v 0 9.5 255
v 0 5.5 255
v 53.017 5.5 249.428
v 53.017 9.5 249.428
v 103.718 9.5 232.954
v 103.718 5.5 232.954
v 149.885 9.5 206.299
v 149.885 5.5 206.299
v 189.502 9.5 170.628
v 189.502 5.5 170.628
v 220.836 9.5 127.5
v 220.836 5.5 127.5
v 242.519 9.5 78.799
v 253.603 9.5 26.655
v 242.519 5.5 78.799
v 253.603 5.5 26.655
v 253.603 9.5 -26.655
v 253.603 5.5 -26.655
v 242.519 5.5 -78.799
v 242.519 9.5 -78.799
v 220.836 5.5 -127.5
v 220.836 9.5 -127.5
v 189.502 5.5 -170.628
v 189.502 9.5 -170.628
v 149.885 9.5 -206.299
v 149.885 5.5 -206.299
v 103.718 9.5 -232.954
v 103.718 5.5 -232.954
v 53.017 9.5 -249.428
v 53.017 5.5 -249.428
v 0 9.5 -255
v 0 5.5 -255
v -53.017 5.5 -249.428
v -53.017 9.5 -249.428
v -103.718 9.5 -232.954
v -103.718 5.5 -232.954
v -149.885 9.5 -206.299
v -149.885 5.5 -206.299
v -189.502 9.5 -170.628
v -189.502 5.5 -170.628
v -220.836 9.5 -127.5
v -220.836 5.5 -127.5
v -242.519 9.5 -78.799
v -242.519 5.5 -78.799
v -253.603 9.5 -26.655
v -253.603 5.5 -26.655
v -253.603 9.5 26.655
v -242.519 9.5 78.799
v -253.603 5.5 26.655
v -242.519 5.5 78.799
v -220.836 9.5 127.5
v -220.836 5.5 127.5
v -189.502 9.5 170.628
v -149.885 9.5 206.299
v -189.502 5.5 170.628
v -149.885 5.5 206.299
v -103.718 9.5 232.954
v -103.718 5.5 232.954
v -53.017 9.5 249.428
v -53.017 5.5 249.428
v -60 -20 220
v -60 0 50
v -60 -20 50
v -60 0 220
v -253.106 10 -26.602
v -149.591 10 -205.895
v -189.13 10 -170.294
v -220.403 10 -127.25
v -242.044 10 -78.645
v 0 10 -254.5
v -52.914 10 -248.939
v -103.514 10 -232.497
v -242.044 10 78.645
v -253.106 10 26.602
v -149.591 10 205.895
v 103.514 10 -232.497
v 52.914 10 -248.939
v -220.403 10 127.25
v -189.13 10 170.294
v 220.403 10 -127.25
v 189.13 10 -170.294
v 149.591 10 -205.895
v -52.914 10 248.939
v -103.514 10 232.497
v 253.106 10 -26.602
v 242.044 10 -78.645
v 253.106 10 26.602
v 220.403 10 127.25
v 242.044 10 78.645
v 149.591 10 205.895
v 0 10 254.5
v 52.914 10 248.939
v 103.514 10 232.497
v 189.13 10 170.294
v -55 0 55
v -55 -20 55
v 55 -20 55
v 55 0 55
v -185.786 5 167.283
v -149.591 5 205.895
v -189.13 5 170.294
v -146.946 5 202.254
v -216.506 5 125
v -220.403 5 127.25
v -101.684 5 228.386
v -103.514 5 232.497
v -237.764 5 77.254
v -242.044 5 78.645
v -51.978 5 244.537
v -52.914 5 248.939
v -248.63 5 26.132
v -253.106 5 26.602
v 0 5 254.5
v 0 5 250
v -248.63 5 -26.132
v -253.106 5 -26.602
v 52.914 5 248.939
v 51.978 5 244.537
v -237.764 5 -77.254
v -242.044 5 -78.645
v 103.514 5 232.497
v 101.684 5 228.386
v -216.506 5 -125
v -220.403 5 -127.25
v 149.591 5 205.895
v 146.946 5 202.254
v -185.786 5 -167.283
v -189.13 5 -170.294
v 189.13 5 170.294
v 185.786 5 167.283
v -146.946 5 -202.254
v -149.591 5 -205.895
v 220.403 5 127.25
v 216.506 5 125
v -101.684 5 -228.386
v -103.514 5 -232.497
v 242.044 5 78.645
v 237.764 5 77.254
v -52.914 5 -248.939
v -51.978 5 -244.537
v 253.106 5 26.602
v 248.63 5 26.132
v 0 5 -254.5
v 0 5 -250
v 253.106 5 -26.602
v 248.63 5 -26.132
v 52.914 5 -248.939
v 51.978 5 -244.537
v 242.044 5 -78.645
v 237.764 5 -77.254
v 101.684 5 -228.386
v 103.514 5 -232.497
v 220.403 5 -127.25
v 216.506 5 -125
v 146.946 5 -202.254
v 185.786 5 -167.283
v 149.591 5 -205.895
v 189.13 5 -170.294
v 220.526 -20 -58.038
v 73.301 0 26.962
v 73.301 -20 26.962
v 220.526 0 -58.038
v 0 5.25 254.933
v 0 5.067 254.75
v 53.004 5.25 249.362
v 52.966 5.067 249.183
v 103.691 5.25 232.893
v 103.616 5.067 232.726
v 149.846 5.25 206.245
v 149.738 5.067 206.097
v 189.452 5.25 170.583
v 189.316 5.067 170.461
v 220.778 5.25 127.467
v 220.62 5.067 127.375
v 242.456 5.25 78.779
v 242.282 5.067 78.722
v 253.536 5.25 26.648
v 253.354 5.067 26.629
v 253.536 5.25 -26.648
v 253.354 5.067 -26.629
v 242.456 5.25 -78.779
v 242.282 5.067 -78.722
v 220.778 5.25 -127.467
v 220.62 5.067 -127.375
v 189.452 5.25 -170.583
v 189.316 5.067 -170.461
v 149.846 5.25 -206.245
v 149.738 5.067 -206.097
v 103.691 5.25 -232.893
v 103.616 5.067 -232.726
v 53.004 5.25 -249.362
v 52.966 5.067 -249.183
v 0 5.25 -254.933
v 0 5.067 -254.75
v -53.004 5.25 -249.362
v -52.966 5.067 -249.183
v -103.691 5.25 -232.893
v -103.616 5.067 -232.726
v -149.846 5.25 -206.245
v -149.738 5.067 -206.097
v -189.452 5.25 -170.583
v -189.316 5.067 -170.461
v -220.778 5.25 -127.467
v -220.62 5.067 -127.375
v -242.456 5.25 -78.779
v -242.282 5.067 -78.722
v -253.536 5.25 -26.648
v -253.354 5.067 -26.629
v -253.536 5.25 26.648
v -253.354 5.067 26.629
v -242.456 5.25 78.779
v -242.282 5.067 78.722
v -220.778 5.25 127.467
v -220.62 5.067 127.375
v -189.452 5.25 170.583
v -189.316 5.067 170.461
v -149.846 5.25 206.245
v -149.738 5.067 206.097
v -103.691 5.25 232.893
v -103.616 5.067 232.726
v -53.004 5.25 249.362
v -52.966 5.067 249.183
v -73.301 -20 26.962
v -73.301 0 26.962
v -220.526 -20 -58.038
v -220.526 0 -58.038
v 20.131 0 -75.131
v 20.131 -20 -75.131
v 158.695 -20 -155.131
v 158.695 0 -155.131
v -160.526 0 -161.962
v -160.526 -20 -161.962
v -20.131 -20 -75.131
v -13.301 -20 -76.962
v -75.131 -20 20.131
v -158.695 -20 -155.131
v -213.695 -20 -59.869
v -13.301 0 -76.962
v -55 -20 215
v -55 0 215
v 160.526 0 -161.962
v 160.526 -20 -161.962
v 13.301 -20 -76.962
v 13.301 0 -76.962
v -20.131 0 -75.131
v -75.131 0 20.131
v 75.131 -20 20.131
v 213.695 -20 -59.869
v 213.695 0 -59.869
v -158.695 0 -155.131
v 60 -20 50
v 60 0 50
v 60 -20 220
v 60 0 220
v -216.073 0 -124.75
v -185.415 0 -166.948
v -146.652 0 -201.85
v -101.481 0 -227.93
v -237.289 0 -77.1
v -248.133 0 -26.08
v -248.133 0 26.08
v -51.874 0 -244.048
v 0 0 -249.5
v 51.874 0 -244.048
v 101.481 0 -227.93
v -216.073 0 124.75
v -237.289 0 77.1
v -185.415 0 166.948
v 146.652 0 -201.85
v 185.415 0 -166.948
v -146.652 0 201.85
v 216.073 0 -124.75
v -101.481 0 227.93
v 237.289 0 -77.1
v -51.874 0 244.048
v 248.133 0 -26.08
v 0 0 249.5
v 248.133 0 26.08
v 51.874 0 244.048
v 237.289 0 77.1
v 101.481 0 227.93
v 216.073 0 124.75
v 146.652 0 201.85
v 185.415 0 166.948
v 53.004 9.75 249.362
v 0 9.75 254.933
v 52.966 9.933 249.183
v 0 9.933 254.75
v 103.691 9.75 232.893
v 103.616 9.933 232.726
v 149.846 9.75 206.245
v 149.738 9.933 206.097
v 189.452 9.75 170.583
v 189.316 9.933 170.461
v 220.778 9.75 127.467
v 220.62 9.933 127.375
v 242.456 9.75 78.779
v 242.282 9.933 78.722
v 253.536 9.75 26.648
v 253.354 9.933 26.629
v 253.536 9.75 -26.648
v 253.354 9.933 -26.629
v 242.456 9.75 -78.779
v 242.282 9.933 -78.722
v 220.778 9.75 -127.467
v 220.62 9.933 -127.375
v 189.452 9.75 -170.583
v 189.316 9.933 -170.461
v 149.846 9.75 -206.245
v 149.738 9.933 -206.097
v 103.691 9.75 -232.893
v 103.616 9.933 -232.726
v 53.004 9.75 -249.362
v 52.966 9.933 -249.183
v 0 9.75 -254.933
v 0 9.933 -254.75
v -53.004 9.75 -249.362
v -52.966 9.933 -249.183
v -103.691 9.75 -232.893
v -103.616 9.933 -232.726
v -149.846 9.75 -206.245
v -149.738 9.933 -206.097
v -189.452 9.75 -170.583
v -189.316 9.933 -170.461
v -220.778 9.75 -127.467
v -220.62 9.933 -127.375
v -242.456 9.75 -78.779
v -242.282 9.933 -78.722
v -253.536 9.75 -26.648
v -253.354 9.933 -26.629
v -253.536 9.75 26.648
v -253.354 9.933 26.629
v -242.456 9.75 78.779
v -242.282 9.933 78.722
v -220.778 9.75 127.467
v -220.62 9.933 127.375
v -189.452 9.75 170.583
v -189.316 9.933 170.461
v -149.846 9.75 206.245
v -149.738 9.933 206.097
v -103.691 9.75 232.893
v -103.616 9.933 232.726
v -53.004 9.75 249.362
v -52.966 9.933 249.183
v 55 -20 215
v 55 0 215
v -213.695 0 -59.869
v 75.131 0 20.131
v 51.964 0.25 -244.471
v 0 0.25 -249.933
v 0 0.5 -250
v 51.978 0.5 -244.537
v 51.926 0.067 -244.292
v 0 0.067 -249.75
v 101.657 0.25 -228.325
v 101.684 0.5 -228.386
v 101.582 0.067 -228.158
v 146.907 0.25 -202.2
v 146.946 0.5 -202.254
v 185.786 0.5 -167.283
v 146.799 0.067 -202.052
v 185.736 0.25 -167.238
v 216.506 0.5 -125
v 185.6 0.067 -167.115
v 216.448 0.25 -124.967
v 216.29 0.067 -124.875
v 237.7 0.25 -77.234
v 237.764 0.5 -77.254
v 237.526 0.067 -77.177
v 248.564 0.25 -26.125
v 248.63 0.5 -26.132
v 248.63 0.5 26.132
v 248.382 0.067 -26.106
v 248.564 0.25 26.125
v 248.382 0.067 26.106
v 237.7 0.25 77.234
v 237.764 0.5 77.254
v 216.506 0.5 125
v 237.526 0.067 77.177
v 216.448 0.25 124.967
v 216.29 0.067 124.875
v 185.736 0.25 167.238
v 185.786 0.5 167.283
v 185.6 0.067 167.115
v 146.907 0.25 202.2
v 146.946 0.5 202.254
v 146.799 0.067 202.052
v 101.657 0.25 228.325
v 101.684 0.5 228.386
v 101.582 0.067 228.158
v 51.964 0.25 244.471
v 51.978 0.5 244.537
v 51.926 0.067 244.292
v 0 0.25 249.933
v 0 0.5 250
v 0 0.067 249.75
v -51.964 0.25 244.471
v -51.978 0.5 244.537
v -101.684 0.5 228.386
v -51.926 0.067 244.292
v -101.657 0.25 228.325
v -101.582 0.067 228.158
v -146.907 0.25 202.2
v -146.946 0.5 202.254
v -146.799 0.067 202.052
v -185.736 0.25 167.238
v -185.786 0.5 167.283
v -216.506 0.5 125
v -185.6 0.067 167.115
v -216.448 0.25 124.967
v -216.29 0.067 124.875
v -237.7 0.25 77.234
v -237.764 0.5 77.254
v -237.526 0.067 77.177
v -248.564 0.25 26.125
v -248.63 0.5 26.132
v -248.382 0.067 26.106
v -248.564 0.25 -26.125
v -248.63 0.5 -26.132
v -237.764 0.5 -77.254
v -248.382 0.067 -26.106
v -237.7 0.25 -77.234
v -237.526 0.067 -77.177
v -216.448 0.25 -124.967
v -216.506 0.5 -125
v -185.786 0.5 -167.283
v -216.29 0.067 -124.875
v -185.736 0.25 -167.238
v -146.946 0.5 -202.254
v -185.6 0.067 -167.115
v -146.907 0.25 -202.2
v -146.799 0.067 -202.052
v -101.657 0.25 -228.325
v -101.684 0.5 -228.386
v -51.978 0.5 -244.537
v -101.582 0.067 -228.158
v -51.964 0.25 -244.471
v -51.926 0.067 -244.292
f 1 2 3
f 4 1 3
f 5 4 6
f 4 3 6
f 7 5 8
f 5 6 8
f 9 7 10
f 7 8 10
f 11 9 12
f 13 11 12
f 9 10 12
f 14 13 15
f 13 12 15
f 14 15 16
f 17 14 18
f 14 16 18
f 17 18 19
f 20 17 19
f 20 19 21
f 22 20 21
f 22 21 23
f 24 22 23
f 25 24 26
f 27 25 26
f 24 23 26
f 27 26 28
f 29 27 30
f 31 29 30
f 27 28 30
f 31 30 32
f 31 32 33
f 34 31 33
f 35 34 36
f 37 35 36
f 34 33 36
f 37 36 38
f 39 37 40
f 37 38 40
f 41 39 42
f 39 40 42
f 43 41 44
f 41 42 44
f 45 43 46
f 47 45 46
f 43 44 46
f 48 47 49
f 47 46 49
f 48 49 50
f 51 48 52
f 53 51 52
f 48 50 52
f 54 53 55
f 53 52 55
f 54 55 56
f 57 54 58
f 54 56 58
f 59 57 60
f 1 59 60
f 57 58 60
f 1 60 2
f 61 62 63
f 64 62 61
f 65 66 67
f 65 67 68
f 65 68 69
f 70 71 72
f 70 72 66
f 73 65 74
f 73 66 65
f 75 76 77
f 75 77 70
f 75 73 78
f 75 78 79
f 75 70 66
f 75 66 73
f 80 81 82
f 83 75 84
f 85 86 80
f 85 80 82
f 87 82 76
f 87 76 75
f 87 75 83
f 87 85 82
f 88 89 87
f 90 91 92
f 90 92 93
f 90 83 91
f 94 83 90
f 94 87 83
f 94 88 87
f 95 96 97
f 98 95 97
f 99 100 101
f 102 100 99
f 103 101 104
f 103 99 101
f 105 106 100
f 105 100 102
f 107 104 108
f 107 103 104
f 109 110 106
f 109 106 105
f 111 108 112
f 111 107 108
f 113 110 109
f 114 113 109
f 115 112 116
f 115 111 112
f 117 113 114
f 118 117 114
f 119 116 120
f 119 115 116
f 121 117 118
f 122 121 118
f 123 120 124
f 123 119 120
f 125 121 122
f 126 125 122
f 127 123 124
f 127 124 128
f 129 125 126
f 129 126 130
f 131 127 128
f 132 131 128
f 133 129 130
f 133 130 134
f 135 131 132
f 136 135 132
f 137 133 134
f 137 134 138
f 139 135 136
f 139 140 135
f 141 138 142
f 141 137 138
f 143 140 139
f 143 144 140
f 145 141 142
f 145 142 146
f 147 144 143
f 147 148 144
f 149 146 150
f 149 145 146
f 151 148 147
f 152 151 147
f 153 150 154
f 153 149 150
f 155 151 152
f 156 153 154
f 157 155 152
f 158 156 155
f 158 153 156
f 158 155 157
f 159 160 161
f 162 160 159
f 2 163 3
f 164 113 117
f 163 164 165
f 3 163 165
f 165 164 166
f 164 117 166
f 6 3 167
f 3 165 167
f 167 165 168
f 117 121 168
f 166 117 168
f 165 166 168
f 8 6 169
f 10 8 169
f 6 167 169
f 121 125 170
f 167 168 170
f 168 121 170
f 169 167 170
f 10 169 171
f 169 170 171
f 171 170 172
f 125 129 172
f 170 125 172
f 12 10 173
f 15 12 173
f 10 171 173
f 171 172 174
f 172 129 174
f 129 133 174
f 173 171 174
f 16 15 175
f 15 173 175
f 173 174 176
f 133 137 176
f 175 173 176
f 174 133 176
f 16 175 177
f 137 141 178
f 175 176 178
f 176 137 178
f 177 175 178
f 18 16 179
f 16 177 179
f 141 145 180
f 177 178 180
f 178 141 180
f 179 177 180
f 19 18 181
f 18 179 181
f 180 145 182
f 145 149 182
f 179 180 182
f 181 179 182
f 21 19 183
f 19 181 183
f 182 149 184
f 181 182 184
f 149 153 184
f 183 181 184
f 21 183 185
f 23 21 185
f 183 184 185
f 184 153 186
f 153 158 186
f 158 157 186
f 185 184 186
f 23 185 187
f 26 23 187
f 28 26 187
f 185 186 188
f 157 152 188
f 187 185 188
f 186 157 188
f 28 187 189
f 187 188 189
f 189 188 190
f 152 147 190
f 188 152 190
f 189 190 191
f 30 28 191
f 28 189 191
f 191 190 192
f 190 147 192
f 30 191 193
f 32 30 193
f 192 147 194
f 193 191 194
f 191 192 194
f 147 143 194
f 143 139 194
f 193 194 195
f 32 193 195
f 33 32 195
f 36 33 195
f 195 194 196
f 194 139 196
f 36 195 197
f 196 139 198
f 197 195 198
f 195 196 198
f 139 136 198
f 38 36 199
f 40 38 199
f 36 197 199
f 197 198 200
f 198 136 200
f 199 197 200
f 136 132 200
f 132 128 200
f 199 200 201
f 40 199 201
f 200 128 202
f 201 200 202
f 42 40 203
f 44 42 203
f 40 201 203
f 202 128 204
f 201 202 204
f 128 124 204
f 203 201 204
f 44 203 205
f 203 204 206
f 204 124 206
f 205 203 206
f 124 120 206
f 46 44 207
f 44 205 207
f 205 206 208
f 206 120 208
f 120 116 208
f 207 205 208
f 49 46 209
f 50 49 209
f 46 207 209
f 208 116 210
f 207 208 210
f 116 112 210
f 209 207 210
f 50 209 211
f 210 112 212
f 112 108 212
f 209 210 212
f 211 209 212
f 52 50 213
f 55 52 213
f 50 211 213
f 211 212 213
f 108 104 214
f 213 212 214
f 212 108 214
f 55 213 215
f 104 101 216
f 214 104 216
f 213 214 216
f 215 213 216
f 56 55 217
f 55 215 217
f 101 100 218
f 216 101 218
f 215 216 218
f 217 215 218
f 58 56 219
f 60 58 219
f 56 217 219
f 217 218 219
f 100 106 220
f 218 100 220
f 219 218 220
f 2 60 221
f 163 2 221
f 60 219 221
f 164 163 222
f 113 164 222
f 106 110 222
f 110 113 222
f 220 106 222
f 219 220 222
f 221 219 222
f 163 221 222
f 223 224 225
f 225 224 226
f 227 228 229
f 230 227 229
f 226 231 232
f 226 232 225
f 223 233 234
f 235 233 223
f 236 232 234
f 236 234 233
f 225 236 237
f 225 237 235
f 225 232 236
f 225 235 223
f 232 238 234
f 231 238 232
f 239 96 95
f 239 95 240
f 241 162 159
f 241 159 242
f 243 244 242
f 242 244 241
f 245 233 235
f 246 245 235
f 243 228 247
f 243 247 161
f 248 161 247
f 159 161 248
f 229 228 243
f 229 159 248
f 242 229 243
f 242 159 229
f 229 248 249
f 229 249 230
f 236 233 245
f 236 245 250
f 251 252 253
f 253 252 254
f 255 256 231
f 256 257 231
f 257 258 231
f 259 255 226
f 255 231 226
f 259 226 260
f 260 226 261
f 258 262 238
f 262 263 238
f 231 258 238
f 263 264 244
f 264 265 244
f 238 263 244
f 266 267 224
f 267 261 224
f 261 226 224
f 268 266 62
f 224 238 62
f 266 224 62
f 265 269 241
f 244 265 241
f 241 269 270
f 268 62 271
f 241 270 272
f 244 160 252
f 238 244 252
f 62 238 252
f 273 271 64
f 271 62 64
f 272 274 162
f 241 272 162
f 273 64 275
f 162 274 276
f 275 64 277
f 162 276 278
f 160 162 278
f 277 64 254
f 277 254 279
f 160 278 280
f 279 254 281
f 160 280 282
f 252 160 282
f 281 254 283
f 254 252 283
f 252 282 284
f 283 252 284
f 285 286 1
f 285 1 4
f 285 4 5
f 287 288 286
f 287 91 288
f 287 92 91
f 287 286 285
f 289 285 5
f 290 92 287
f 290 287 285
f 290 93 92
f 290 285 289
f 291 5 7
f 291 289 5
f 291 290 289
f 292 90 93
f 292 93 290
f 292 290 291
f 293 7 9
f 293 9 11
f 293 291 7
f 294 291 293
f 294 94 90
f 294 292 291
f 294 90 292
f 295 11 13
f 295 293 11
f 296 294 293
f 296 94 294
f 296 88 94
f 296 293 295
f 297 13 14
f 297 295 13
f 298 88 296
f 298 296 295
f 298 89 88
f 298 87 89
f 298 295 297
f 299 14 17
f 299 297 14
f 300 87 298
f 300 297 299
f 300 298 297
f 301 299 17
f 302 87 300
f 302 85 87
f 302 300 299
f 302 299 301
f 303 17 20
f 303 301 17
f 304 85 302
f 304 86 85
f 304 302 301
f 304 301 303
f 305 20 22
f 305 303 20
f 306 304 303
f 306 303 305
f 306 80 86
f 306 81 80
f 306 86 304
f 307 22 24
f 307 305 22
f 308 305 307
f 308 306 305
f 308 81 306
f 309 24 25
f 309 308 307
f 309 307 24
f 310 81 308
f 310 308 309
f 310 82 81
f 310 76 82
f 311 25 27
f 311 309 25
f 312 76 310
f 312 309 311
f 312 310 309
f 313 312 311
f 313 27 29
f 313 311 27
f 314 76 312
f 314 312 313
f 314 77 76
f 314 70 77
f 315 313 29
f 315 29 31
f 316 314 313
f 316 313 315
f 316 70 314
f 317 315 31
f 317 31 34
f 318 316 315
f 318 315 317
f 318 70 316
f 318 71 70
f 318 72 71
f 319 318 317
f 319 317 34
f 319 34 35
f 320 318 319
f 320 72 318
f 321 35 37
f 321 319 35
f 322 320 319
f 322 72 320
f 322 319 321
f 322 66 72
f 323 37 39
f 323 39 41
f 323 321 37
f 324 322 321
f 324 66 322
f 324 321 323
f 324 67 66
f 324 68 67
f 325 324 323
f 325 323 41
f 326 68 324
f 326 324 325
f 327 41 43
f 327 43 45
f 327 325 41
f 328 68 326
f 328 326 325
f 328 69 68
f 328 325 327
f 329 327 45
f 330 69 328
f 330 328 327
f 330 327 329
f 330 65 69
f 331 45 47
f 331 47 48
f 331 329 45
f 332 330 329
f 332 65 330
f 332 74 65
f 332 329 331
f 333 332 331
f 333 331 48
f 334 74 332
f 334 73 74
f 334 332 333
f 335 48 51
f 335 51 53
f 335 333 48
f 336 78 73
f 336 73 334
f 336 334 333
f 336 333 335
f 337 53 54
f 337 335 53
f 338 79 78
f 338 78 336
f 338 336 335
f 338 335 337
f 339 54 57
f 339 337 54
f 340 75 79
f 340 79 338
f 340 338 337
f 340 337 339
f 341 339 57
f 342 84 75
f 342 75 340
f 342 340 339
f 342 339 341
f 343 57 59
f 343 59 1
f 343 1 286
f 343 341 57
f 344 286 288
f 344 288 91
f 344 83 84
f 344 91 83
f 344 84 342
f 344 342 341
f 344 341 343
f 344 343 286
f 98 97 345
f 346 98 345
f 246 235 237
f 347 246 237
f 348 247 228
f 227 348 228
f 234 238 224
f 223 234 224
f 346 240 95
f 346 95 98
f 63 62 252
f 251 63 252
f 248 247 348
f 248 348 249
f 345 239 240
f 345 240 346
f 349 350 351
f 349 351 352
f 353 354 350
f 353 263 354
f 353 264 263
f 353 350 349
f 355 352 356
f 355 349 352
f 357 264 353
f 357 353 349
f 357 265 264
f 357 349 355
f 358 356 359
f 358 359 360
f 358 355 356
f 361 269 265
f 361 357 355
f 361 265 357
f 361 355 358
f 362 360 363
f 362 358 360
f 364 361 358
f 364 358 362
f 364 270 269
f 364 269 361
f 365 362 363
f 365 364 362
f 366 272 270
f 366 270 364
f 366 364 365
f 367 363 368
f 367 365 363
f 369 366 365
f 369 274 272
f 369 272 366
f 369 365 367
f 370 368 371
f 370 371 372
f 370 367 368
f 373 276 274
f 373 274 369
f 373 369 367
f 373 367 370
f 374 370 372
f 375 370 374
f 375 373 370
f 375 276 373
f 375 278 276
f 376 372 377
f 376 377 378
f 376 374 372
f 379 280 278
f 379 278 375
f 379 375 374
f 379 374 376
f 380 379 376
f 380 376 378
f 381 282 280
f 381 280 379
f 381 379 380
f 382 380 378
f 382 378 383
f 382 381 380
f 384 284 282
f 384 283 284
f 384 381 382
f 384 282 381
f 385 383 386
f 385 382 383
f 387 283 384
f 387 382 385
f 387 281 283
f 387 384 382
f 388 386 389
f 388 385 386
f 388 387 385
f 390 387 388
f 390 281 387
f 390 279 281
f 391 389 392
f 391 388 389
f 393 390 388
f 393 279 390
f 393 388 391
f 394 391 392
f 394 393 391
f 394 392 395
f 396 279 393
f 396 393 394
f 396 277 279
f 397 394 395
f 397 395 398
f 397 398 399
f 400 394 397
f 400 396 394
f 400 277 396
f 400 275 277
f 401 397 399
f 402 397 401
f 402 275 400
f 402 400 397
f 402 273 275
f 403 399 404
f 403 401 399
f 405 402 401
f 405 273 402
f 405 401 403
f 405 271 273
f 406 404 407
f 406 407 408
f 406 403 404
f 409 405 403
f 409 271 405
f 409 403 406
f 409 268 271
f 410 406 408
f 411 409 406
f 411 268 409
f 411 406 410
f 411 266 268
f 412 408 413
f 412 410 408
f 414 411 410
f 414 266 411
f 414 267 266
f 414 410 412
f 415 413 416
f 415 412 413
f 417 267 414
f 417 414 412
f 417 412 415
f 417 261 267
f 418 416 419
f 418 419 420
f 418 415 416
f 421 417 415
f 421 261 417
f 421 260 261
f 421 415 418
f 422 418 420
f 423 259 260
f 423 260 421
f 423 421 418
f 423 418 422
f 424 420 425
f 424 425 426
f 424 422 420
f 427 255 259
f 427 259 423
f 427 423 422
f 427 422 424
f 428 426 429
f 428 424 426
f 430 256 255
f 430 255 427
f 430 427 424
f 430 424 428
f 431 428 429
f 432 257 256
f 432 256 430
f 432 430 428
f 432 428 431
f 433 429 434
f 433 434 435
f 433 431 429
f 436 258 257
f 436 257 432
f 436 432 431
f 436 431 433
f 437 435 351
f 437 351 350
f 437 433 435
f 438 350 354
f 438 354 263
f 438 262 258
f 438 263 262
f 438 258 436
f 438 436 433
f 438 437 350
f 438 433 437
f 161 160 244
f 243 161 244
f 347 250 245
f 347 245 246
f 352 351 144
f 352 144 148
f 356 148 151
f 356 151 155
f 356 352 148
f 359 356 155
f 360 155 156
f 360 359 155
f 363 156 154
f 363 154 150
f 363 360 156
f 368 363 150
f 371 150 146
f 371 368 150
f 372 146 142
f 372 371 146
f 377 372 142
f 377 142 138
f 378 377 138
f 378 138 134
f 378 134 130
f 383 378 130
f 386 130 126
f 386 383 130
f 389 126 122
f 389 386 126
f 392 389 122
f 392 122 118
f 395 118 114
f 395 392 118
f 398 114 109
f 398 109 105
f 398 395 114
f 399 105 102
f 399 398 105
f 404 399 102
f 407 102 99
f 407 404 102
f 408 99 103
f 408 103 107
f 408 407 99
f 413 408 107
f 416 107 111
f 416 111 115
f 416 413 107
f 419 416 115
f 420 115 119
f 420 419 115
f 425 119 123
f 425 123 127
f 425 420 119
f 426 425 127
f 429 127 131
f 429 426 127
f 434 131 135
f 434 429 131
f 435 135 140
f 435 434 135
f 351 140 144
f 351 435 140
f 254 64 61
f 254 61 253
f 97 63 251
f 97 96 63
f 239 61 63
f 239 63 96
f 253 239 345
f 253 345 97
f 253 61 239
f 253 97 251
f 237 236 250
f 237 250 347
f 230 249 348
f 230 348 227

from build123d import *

# Parameters (mm, degrees)
SKETCH1_R           = 255
BOSS_EXTRUDE1_DEPTH = 10
SKETCH4_R           = 255
SKETCH4_R_2         = 250
CUT_EXTRUDE1_DEPTH  = 5
FILLET1_R           = 0.5
SKETCH5_W           = 120
SKETCH5_H           = 170
BOSS_EXTRUDE3_DEPTH = 20
CIRPATTERN2_COUNT   = 3
SKETCH6_W           = 110
SKETCH6_H           = 160
CUT_EXTRUDE3_DEPTH  = 20
CIRPATTERN4_COUNT   = 3


with BuildPart() as part:
    # Sketch1 → Boss-Extrude1 (new body)
    with BuildSketch(Plane(origin=(0, 0, 0), x_dir=(1, 0, 0), z_dir=(0, 1, 0))):
        with Locations(Location((0, 0, 0), (0, 0, 270))):
            Circle(SKETCH1_R)
    extrude(amount=BOSS_EXTRUDE1_DEPTH)

    # Sketch4 → Cut-Extrude1 (cut)
    with BuildSketch(Plane(origin=(0, 0, 0), x_dir=(-1, 0, 0), z_dir=(0, -1, 0))):
        with Locations(Location((0, 0, 0), (0, 0, 90))):
            Circle(SKETCH4_R)
        with Locations(Location((0, 0, 0), (0, 0, 90))):
            Circle(SKETCH4_R_2, mode=Mode.SUBTRACT)
    extrude(amount=-CUT_EXTRUDE1_DEPTH, mode=Mode.SUBTRACT)

    # Fillet1
    fillet1_edges = [part.edges().sort_by_distance(p)[0] for p in [
        (0, 10, -255),
        (0, 0, 250),
        (0, 5, -255),
    ]]
    fillet(fillet1_edges, radius=FILLET1_R)

    # Sketch5 → Boss-Extrude3 (add)
    with BuildSketch(Plane.XZ):
        with Locations((0, 135)):
            Rectangle(SKETCH5_W, SKETCH5_H)
    boss_extrude3 = extrude(amount=BOSS_EXTRUDE3_DEPTH)

    # CirPattern2: Boss-Extrude3 ×3 about axis
    cirpattern2_axis = Axis((0, 0, 0), (0, 1, 0))
    for i in range(1, CIRPATTERN2_COUNT):
        add(boss_extrude3.rotate(cirpattern2_axis, i * 360 / CIRPATTERN2_COUNT))

    # Sketch6 → Cut-Extrude3 (cut)
    with BuildSketch(Plane.XZ.offset(20)):
        with Locations((0, 135)):
            Rectangle(SKETCH6_W, SKETCH6_H)
    cut_extrude3 = extrude(amount=-CUT_EXTRUDE3_DEPTH, mode=Mode.SUBTRACT)

    # CirPattern4: Cut-Extrude3 ×3 about axis
    cirpattern4_axis = Axis((0, 0, 0), (0, 1, 0))
    for i in range(1, CIRPATTERN4_COUNT):
        add(cut_extrude3.rotate(cirpattern4_axis, i * 360 / CIRPATTERN4_COUNT), mode=Mode.SUBTRACT)


solid = part.part
